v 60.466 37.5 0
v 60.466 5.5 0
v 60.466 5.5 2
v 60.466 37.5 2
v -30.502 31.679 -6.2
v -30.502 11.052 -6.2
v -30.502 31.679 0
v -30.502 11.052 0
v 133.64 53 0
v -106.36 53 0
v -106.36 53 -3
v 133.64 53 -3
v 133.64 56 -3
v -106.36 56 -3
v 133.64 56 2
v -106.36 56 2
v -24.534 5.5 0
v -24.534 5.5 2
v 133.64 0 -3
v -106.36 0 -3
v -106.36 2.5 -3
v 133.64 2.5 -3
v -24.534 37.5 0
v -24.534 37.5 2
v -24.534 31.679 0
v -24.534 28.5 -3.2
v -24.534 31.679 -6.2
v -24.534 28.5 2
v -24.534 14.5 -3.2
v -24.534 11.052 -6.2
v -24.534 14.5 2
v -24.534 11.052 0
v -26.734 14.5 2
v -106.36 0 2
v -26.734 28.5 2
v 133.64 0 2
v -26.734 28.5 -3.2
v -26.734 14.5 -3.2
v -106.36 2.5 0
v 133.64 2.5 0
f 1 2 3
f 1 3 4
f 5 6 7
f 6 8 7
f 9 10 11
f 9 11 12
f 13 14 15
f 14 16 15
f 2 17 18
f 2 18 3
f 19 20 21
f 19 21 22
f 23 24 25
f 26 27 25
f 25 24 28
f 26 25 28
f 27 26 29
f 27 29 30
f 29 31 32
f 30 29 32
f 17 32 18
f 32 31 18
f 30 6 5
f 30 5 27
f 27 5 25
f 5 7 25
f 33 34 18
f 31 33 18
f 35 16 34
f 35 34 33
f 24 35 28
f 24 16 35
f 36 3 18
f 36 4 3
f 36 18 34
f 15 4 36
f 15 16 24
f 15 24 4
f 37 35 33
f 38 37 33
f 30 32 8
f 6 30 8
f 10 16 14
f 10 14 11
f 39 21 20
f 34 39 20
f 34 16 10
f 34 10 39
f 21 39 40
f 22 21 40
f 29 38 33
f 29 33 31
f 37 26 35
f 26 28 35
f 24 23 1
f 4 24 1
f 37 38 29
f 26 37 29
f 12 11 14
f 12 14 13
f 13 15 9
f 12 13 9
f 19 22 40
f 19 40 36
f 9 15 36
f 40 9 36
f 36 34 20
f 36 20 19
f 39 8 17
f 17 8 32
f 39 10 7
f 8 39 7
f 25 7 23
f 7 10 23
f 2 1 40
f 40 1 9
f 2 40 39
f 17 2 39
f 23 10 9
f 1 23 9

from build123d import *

# Parameters (mm, degrees)
F0_W      = 240
F0_H      = 56
F0_W_2    = 85
F0_H_2    = 32
F1_DEPTH  = 2
F2_W      = 2.2
F2_H      = 14
F3_DEPTH  = 25
F5_DEPTH  = 3.2
F6_W      = 2.2
F6_H      = 14
F7_DEPTH  = 3
F8_W      = 240
F8_H      = 3
F9_DEPTH  = 3
F8_H_2    = 2.5
F10_DEPTH = 3


with BuildPart() as f1:
    # F0 (on Top) → F1 (new body)
    with BuildSketch(Plane.XY):
        with Locations((13.640271, 28)):
            Rectangle(F0_W, F0_H)
        with Locations((17.96643, 21.5)):
            Rectangle(F0_W_2, F0_H_2, mode=Mode.SUBTRACT)
    extrude(amount=F1_DEPTH)

    # F2 (on face) → F3 (cut)
    with BuildSketch(Plane.XY.offset(2)):
        with Locations((-25.63357, 21.5)):
            Rectangle(F2_W, F2_H)
    extrude(amount=-F3_DEPTH, mode=Mode.SUBTRACT)

    # F4 (on face) → F5 (join)
    with BuildSketch(Plane(origin=(0, 0, 0), x_dir=(1, 0, 0), z_dir=(0, 0, -1))):
        Polygon((-24.53357, -14.5), (-24.53357, -11.051576), (-30.502366, -11.051576), (-30.502366, -31.678651), (-24.53357, -31.678651), (-24.53357, -28.5), (-26.73357, -28.5), (-26.73357, -14.5), align=None)
    extrude(amount=F5_DEPTH)

    # F6 (on face) → F7 (join)
    with BuildSketch(Plane(origin=(0, 0, -3.2), x_dir=(1, 0, 0), z_dir=(0, 0, -1))):
        Polygon((-24.53357, -14.5), (-24.53357, -11.051576), (-30.502366, -11.051576), (-30.502366, -31.678651), (-24.53357, -31.678651), (-24.53357, -28.5), (-26.73357, -28.5), (-26.73357, -14.5), align=None)
        with Locations((-25.63357, -21.5)):
            Rectangle(F6_W, F6_H)
    extrude(amount=F7_DEPTH)

    # F8 (on face) → F9 (join)
    with BuildSketch(Plane(origin=(0, 0, 0), x_dir=(1, 0, 0), z_dir=(0, 0, -1))):
        with Locations((13.640271, -54.5)):
            Rectangle(F8_W, F8_H)
    extrude(amount=F9_DEPTH)

    # F8 (on face) → F10 (join)
    with BuildSketch(Plane(origin=(0, 0, 0), x_dir=(1, 0, 0), z_dir=(0, 0, -1))):
        with Locations((13.640271, -1.25)):
            Rectangle(F8_W, F8_H_2)
    extrude(amount=F10_DEPTH)


solid = f1.part
